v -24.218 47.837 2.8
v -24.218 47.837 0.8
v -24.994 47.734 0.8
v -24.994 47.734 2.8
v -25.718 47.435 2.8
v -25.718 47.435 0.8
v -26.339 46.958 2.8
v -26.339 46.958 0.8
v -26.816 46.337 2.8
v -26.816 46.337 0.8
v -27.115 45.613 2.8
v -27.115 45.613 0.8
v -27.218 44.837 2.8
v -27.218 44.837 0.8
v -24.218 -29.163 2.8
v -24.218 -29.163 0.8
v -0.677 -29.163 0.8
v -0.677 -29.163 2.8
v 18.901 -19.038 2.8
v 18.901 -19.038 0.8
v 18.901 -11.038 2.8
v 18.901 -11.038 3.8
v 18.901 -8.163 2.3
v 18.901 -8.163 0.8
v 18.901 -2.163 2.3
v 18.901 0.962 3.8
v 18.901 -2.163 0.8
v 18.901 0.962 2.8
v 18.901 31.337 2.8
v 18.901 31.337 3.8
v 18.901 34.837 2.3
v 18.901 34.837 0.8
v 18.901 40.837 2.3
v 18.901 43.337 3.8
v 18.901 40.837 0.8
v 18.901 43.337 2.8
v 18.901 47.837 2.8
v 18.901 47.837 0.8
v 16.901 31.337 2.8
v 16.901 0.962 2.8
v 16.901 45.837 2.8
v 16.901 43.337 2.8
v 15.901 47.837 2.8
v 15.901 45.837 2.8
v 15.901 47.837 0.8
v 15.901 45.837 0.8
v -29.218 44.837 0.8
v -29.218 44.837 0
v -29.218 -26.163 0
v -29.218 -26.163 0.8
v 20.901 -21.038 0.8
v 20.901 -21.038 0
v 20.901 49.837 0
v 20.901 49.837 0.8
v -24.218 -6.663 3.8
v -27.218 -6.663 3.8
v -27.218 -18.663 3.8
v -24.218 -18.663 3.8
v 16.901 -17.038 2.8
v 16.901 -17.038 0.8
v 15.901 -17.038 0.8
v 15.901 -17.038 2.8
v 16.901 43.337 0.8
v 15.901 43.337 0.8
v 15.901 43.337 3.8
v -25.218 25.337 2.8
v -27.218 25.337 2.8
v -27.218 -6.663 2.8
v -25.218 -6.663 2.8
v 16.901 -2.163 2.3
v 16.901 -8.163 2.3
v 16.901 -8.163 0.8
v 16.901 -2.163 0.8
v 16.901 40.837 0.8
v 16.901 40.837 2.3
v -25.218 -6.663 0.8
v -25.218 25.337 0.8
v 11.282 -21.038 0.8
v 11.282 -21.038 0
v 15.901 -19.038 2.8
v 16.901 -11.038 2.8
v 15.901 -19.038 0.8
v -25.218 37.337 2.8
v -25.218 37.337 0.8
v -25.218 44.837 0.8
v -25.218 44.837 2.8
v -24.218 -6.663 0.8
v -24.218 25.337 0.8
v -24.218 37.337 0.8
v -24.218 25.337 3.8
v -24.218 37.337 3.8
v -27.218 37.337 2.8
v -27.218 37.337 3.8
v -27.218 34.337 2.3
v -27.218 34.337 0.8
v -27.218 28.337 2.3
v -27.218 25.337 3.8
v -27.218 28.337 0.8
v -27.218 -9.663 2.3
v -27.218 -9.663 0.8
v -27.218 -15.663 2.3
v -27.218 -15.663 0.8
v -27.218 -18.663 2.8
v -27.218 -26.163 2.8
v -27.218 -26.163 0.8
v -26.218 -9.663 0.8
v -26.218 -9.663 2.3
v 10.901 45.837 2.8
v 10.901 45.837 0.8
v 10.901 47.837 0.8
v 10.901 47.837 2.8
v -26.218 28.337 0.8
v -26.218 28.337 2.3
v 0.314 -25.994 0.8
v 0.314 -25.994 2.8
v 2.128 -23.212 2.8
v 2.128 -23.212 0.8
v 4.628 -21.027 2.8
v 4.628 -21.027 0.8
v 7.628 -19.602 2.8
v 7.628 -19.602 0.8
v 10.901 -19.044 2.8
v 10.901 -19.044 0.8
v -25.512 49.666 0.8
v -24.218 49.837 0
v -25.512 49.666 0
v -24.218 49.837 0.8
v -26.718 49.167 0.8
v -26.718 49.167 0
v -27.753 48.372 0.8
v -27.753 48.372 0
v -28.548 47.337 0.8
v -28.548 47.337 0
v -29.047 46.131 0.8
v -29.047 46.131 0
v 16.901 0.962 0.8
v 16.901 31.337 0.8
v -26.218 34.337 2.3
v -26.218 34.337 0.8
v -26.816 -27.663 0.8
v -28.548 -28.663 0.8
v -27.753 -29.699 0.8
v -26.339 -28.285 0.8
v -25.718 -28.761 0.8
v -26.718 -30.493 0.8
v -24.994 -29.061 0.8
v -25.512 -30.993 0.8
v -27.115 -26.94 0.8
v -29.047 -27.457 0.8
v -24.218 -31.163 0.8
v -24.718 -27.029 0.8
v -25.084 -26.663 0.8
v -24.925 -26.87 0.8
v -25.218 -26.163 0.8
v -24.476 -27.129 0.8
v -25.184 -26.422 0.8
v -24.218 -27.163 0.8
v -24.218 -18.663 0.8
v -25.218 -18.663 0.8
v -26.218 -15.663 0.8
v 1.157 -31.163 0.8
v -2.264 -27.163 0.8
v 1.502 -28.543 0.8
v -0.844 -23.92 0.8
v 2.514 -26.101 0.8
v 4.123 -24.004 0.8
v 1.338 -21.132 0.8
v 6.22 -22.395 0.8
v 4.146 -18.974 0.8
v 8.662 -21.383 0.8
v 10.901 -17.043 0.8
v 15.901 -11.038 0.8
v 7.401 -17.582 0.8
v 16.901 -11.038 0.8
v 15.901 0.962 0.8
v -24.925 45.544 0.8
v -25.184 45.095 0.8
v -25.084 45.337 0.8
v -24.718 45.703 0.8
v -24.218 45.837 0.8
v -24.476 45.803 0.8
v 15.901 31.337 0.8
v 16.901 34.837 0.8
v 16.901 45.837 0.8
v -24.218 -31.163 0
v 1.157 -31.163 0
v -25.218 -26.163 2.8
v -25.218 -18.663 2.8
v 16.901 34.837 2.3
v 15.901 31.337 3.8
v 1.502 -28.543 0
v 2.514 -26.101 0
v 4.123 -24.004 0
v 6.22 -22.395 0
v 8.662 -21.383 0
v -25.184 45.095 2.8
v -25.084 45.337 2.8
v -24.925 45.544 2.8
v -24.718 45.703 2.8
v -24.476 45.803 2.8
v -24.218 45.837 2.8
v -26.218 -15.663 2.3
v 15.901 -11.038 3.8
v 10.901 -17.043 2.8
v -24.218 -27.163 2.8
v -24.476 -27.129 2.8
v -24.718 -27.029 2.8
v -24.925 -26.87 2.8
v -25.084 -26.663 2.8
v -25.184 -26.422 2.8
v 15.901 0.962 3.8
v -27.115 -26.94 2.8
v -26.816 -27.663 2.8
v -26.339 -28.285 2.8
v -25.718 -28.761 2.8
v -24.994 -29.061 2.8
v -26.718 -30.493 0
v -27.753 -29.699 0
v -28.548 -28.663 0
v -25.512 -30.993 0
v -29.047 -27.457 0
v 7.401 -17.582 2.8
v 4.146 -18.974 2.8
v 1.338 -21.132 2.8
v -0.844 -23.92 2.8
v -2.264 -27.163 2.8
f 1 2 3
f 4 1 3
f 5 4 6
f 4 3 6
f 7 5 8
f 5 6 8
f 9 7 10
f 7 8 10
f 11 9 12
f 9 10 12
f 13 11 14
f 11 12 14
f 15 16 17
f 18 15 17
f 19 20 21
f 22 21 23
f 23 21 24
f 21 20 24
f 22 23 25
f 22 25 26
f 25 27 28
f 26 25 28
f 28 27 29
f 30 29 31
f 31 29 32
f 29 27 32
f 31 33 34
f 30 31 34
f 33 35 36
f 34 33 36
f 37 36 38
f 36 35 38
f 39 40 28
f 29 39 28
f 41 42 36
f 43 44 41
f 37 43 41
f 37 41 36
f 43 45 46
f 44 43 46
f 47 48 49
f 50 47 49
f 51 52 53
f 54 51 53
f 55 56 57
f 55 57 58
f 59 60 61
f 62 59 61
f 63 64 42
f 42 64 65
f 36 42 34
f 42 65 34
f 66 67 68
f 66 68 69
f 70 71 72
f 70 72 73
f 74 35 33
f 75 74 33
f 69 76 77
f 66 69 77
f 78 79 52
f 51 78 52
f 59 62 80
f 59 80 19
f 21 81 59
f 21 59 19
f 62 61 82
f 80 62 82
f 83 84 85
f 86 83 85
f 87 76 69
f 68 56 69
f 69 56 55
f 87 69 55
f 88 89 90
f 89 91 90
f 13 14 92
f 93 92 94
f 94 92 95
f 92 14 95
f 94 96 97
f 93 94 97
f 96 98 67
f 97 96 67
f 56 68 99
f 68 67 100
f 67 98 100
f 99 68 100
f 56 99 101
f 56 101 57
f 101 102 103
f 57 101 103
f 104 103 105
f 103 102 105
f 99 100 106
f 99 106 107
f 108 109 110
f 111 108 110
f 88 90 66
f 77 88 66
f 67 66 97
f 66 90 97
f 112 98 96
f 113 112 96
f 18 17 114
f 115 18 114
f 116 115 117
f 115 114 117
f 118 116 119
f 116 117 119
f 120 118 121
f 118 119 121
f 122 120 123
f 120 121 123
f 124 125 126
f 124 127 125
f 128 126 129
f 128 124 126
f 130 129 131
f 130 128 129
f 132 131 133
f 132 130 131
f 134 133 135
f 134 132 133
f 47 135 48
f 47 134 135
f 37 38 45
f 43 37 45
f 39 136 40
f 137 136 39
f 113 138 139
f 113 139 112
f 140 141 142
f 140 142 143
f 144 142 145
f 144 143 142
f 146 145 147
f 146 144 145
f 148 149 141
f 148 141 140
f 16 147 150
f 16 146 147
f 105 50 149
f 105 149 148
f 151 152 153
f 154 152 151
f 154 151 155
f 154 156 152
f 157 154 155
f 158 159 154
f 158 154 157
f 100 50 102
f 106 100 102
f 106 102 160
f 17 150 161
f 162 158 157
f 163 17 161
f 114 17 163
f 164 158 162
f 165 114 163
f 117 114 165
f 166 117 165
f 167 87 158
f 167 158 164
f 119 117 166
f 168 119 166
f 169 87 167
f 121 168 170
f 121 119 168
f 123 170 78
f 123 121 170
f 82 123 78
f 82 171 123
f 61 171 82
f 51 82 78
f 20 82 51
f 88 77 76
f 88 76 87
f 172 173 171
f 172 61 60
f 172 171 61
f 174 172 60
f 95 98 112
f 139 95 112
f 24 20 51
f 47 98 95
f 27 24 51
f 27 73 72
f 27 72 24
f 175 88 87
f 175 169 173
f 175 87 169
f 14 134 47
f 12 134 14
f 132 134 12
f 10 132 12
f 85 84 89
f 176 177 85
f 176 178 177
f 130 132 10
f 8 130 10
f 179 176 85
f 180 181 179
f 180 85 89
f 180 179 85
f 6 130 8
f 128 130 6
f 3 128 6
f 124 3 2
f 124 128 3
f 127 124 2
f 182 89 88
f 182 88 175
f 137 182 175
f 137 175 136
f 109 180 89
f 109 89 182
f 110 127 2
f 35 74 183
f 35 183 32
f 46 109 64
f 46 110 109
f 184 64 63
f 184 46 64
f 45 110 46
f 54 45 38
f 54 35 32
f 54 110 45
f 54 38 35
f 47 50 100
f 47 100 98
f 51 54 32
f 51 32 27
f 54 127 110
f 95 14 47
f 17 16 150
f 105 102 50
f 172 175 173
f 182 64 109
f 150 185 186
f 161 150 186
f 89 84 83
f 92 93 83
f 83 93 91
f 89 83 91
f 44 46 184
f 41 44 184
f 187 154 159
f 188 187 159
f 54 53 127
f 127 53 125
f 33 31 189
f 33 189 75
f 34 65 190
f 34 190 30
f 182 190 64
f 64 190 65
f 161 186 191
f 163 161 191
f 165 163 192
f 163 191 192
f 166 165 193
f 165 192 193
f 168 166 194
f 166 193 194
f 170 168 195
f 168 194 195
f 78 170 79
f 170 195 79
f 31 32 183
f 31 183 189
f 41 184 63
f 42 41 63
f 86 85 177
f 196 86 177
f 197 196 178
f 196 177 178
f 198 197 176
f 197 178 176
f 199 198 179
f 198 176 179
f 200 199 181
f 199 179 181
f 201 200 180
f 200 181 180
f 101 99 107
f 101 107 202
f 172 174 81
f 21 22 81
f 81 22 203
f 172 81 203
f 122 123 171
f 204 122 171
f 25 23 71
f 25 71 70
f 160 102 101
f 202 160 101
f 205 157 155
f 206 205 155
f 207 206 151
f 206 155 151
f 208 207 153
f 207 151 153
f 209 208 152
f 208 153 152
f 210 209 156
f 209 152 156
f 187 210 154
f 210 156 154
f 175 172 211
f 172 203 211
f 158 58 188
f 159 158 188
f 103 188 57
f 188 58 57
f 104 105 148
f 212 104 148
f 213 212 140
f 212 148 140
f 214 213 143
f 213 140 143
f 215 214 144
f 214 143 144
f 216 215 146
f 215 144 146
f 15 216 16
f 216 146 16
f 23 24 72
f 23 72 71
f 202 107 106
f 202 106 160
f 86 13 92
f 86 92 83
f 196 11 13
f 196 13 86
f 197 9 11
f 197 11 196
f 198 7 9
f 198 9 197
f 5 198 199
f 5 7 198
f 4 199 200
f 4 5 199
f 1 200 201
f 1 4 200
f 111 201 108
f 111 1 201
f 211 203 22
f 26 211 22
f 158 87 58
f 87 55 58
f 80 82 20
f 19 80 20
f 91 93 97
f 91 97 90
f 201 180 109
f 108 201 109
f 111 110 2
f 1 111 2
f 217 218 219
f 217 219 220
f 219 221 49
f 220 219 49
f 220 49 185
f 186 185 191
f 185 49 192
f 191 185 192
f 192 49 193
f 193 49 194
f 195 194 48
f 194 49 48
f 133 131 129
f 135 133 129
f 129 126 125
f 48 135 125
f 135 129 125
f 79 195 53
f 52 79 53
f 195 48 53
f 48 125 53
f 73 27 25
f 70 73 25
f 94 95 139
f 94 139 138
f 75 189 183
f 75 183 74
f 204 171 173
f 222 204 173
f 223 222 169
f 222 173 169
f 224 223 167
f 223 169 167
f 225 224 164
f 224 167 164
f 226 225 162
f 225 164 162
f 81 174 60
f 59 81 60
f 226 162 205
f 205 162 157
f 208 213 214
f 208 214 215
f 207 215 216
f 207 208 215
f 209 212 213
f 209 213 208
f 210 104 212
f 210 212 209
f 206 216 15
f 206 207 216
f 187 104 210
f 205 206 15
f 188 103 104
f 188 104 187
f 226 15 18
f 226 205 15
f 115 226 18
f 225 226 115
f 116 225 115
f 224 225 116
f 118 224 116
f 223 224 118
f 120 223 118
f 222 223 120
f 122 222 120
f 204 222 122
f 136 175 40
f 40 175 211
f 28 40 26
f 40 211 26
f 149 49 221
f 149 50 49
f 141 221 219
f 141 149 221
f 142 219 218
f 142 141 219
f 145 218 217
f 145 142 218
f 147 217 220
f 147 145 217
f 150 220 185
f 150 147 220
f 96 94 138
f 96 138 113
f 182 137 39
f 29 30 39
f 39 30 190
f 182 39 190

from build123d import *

# Parameters (mm, degrees)
F1_DEPTH  = 0.8
F2_R      = 5
F3_R      = 5
F5_DEPTH  = 3
F8_W      = 6
F8_H      = 1.5
F9_DEPTH  = 2
F11_DEPTH = 1.5
F12_DEPTH = 1.5
F6_W      = 6
F6_H      = 1.5
F13_DEPTH = 1
F14_W     = 2
F14_H     = 32
F14_H_2   = 30.375
F15_DEPTH = 2


# Not quite as in the source:
# - an extrude ends at something that could not be found from the text; its depth is read off the source's solid


with BuildPart() as f1:
    # F0 (on Top) → F1 (new body)
    with BuildSketch(Plane.XY):
        with BuildLine():
            Line((20.9010709455, 49.8366734011), (-29.2176790545, 49.8366734011))
            Line((-29.2176790545, 49.8366734011), (-29.2176790545, -31.1633265989))
            Line((-29.2176790545, -31.1633265989), (1.1573209455, -31.1633265989))
            ThreePointArc((1.1573209455, -31.1633265989), (4.122864786, -24.0038704394), (11.2823209455, -21.0383265989))
            Line((11.2823209455, -21.0383265989), (20.9010709455, -21.0383265989))
            Line((20.9010709455, -21.0383265989), (20.9010709455, 49.8366734011))
        make_face()
    extrude(amount=F1_DEPTH)

    # F2
    f2_edges = [f1.edges().sort_by_distance(p)[0] for p in [
        (-29.217679, 49.836673, 0.4),
    ]]
    fillet(f2_edges, radius=F2_R)

    # F3
    f3_edges = [f1.edges().sort_by_distance(p)[0] for p in [
        (-29.217679, -31.163327, 0.4),
    ]]
    fillet(f3_edges, radius=F3_R)

    # F4 (on face) → F5 (join)
    with BuildSketch(Plane.XY.offset(0.8)):
        with BuildLine():
            ThreePointArc((-24.2176790545, 47.8366734011), (-26.338999398, 46.9579937447), (-27.2176790545, 44.8366734011))
            Line((-27.2176790545, 44.8366734011), (-27.2176790545, -26.1633265989))
            ThreePointArc((-27.2176790545, -26.1633265989), (-26.338999398, -28.2846469425), (-24.2176790545, -29.1633265989))
            Line((-24.2176790545, -29.1633265989), (-0.6765930938, -29.1633265989))
            ThreePointArc((-0.6765930938, -29.1633265989), (3.4476025396, -21.9095267037), (11.2823209455, -19.0383265989))
            Line((11.2823209455, -19.0383265989), (18.9010709455, -19.0383265989))
            Line((18.9010709455, -19.0383265989), (18.9010709455, 47.8366734011))
            Line((18.9010709455, 47.8366734011), (-24.2176790545, 47.8366734011))
        make_face()
    extrude(amount=F5_DEPTH)

    # F8 (on face) → F9 (cut)
    with BuildSketch(Plane.YZ.offset(18.9010709455)):
        with Locations((-5.1633265989, 1.55)):
            Rectangle(F8_W, F8_H)
        with Locations((37.8366734011, 1.55)):
            Rectangle(F8_W, F8_H)
    extrude(amount=-F9_DEPTH, mode=Mode.SUBTRACT)

    # F10 (on face) → F11 (cut)
    with BuildSketch(Plane.XY.offset(3.8)):
        with BuildLine():
            Line((-24.2176790545, -18.6633265989), (-27.2176790545, -18.6633265989))
            Line((-27.2176790545, -18.6633265989), (-27.2176790545, -26.1633265989))
            ThreePointArc((-27.2176790545, -26.1633265989), (-26.338999398, -28.2846469425), (-24.2176790545, -29.1633265989))
            Line((-24.2176790545, -29.1633265989), (-0.6765930938, -29.1633265989))
            ThreePointArc((-0.6765930938, -29.1633265989), (3.4476025396, -21.9095267037), (11.2823209455, -19.0383265989))
            Line((11.2823209455, -19.0383265989), (18.9010709455, -19.0383265989))
            Line((18.9010709455, -19.0383265989), (18.9010709455, -11.0383265989))
            Line((18.9010709455, -11.0383265989), (15.9010709455, -11.0383265989))
            Line((15.9010709455, -11.0383265989), (15.9010709455, 0.9616734011))
            Line((15.9010709455, 0.9616734011), (18.9010709455, 0.9616734011))
            Line((18.9010709455, 0.9616734011), (18.9010709455, 31.3366734011))
            Line((18.9010709455, 31.3366734011), (15.9010709455, 31.3366734011))
            Line((15.9010709455, 31.3366734011), (15.9010709455, 43.3366734011))
            Line((15.9010709455, 43.3366734011), (18.9010709455, 43.3366734011))
            Line((18.9010709455, 43.3366734011), (18.9010709455, 47.8366734011))
            Line((18.9010709455, 47.8366734011), (-24.2176790545, 47.8366734011))
            ThreePointArc((-24.2176790545, 47.8366734011), (-26.338999398, 46.9579937447), (-27.2176790545, 44.8366734011))
            Line((-27.2176790545, 44.8366734011), (-27.2176790545, 37.3366734011))
            Line((-27.2176790545, 37.3366734011), (-24.2176790545, 37.3366734011))
            Line((-24.2176790545, 37.3366734011), (-24.2176790545, 25.3366734011))
            Line((-24.2176790545, 25.3366734011), (-27.2176790545, 25.3366734011))
            Line((-27.2176790545, 25.3366734011), (-27.2176790545, -6.6633265989))
            Line((-27.2176790545, -6.6633265989), (-24.2176790545, -6.6633265989))
            Line((-24.2176790545, -6.6633265989), (-24.2176790545, -18.6633265989))
        make_face()
    extrude(amount=-F11_DEPTH, mode=Mode.SUBTRACT)

    # F12 (cut, through all): a face of the model
    f12_faces = [f1.faces().sort_by_distance(p)[0] for p in [
        (-4.8878926555, 10.949585375, 2.3),
    ]]
    extrude(f12_faces, amount=-F12_DEPTH, mode=Mode.SUBTRACT)

    # F6 (on face) → F13 (cut)
    with BuildSketch(Plane(origin=(-27.2176790545, 0, 0), x_dir=(0, -1, 0), z_dir=(-1, 0, 0))):
        with Locations((-31.3366734011, 1.55)):
            Rectangle(F6_W, F6_H)
        with Locations((12.6633265989, 1.55)):
            Rectangle(F6_W, F6_H)
    extrude(amount=-F13_DEPTH, mode=Mode.SUBTRACT)

    # F14 (on face) → F15 (join)
    with BuildSketch(Plane.XY.offset(0.8)):
        with BuildLine():
            Line((-24.2176790545, -29.1633265989), (-0.6765930938, -29.1633265989))
            ThreePointArc((-0.6765930938, -29.1633265989), (3.3030681077, -22.0338606151), (10.9010709455, -19.04432196))
            Line((10.9010709455, -19.04432196), (10.9010709455, -17.0434727244))
            ThreePointArc((10.9010709455, -17.0434727244), (2.6741584042, -19.9644354635), (-2.2644729556, -27.1633265989))
            Line((-2.2644729556, -27.1633265989), (-24.2176790545, -27.1633265989))
            ThreePointArc((-24.2176790545, -27.1633265989), (-24.9247858357, -26.8704333801), (-25.2176790545, -26.1633265989))
            Line((-25.2176790545, -26.1633265989), (-25.2176790545, -18.6633265989))
            Line((-25.2176790545, -18.6633265989), (-27.2176790545, -18.6633265989))
            Line((-27.2176790545, -18.6633265989), (-27.2176790545, -26.1633265989))
            ThreePointArc((-27.2176790545, -26.1633265989), (-26.338999398, -28.2846469425), (-24.2176790545, -29.1633265989))
        make_face()
        Polygon((15.9010709455, -17.0383265989), (15.9010709455, -19.0383265989), (18.9010709455, -19.0383265989), (18.9010709455, -11.0383265989), (16.9010709455, -11.0383265989), (16.9010709455, -17.0383265989), align=None)
        Polygon((18.9010709455, 43.3366734011), (18.9010709455, 47.8366734011), (15.9010709455, 47.8366734011), (15.9010709455, 45.8366734011), (16.9010709455, 45.8366734011), (16.9010709455, 43.3366734011), align=None)
        with BuildLine():
            Line((10.9010709455, 47.8366734011), (-24.2176790545, 47.8366734011))
            ThreePointArc((-24.2176790545, 47.8366734011), (-26.338999398, 46.9579937447), (-27.2176790545, 44.8366734011))
            Line((-27.2176790545, 44.8366734011), (-27.2176790545, 37.3366734011))
            Line((-27.2176790545, 37.3366734011), (-25.2176790545, 37.3366734011))
            Line((-25.2176790545, 37.3366734011), (-25.2176790545, 44.8366734011))
            ThreePointArc((-25.2176790545, 44.8366734011), (-24.9247858357, 45.5437801823), (-24.2176790545, 45.8366734011))
            Line((-24.2176790545, 45.8366734011), (10.9010709455, 45.8366734011))
            Line((10.9010709455, 45.8366734011), (10.9010709455, 47.8366734011))
        make_face()
        with Locations((-26.2176790545, 9.3366734011)):
            Rectangle(F14_W, F14_H)
        with Locations((17.9010709455, 16.1491734011)):
            Rectangle(F14_W, F14_H_2)
    extrude(amount=F15_DEPTH)


solid = f1.part
